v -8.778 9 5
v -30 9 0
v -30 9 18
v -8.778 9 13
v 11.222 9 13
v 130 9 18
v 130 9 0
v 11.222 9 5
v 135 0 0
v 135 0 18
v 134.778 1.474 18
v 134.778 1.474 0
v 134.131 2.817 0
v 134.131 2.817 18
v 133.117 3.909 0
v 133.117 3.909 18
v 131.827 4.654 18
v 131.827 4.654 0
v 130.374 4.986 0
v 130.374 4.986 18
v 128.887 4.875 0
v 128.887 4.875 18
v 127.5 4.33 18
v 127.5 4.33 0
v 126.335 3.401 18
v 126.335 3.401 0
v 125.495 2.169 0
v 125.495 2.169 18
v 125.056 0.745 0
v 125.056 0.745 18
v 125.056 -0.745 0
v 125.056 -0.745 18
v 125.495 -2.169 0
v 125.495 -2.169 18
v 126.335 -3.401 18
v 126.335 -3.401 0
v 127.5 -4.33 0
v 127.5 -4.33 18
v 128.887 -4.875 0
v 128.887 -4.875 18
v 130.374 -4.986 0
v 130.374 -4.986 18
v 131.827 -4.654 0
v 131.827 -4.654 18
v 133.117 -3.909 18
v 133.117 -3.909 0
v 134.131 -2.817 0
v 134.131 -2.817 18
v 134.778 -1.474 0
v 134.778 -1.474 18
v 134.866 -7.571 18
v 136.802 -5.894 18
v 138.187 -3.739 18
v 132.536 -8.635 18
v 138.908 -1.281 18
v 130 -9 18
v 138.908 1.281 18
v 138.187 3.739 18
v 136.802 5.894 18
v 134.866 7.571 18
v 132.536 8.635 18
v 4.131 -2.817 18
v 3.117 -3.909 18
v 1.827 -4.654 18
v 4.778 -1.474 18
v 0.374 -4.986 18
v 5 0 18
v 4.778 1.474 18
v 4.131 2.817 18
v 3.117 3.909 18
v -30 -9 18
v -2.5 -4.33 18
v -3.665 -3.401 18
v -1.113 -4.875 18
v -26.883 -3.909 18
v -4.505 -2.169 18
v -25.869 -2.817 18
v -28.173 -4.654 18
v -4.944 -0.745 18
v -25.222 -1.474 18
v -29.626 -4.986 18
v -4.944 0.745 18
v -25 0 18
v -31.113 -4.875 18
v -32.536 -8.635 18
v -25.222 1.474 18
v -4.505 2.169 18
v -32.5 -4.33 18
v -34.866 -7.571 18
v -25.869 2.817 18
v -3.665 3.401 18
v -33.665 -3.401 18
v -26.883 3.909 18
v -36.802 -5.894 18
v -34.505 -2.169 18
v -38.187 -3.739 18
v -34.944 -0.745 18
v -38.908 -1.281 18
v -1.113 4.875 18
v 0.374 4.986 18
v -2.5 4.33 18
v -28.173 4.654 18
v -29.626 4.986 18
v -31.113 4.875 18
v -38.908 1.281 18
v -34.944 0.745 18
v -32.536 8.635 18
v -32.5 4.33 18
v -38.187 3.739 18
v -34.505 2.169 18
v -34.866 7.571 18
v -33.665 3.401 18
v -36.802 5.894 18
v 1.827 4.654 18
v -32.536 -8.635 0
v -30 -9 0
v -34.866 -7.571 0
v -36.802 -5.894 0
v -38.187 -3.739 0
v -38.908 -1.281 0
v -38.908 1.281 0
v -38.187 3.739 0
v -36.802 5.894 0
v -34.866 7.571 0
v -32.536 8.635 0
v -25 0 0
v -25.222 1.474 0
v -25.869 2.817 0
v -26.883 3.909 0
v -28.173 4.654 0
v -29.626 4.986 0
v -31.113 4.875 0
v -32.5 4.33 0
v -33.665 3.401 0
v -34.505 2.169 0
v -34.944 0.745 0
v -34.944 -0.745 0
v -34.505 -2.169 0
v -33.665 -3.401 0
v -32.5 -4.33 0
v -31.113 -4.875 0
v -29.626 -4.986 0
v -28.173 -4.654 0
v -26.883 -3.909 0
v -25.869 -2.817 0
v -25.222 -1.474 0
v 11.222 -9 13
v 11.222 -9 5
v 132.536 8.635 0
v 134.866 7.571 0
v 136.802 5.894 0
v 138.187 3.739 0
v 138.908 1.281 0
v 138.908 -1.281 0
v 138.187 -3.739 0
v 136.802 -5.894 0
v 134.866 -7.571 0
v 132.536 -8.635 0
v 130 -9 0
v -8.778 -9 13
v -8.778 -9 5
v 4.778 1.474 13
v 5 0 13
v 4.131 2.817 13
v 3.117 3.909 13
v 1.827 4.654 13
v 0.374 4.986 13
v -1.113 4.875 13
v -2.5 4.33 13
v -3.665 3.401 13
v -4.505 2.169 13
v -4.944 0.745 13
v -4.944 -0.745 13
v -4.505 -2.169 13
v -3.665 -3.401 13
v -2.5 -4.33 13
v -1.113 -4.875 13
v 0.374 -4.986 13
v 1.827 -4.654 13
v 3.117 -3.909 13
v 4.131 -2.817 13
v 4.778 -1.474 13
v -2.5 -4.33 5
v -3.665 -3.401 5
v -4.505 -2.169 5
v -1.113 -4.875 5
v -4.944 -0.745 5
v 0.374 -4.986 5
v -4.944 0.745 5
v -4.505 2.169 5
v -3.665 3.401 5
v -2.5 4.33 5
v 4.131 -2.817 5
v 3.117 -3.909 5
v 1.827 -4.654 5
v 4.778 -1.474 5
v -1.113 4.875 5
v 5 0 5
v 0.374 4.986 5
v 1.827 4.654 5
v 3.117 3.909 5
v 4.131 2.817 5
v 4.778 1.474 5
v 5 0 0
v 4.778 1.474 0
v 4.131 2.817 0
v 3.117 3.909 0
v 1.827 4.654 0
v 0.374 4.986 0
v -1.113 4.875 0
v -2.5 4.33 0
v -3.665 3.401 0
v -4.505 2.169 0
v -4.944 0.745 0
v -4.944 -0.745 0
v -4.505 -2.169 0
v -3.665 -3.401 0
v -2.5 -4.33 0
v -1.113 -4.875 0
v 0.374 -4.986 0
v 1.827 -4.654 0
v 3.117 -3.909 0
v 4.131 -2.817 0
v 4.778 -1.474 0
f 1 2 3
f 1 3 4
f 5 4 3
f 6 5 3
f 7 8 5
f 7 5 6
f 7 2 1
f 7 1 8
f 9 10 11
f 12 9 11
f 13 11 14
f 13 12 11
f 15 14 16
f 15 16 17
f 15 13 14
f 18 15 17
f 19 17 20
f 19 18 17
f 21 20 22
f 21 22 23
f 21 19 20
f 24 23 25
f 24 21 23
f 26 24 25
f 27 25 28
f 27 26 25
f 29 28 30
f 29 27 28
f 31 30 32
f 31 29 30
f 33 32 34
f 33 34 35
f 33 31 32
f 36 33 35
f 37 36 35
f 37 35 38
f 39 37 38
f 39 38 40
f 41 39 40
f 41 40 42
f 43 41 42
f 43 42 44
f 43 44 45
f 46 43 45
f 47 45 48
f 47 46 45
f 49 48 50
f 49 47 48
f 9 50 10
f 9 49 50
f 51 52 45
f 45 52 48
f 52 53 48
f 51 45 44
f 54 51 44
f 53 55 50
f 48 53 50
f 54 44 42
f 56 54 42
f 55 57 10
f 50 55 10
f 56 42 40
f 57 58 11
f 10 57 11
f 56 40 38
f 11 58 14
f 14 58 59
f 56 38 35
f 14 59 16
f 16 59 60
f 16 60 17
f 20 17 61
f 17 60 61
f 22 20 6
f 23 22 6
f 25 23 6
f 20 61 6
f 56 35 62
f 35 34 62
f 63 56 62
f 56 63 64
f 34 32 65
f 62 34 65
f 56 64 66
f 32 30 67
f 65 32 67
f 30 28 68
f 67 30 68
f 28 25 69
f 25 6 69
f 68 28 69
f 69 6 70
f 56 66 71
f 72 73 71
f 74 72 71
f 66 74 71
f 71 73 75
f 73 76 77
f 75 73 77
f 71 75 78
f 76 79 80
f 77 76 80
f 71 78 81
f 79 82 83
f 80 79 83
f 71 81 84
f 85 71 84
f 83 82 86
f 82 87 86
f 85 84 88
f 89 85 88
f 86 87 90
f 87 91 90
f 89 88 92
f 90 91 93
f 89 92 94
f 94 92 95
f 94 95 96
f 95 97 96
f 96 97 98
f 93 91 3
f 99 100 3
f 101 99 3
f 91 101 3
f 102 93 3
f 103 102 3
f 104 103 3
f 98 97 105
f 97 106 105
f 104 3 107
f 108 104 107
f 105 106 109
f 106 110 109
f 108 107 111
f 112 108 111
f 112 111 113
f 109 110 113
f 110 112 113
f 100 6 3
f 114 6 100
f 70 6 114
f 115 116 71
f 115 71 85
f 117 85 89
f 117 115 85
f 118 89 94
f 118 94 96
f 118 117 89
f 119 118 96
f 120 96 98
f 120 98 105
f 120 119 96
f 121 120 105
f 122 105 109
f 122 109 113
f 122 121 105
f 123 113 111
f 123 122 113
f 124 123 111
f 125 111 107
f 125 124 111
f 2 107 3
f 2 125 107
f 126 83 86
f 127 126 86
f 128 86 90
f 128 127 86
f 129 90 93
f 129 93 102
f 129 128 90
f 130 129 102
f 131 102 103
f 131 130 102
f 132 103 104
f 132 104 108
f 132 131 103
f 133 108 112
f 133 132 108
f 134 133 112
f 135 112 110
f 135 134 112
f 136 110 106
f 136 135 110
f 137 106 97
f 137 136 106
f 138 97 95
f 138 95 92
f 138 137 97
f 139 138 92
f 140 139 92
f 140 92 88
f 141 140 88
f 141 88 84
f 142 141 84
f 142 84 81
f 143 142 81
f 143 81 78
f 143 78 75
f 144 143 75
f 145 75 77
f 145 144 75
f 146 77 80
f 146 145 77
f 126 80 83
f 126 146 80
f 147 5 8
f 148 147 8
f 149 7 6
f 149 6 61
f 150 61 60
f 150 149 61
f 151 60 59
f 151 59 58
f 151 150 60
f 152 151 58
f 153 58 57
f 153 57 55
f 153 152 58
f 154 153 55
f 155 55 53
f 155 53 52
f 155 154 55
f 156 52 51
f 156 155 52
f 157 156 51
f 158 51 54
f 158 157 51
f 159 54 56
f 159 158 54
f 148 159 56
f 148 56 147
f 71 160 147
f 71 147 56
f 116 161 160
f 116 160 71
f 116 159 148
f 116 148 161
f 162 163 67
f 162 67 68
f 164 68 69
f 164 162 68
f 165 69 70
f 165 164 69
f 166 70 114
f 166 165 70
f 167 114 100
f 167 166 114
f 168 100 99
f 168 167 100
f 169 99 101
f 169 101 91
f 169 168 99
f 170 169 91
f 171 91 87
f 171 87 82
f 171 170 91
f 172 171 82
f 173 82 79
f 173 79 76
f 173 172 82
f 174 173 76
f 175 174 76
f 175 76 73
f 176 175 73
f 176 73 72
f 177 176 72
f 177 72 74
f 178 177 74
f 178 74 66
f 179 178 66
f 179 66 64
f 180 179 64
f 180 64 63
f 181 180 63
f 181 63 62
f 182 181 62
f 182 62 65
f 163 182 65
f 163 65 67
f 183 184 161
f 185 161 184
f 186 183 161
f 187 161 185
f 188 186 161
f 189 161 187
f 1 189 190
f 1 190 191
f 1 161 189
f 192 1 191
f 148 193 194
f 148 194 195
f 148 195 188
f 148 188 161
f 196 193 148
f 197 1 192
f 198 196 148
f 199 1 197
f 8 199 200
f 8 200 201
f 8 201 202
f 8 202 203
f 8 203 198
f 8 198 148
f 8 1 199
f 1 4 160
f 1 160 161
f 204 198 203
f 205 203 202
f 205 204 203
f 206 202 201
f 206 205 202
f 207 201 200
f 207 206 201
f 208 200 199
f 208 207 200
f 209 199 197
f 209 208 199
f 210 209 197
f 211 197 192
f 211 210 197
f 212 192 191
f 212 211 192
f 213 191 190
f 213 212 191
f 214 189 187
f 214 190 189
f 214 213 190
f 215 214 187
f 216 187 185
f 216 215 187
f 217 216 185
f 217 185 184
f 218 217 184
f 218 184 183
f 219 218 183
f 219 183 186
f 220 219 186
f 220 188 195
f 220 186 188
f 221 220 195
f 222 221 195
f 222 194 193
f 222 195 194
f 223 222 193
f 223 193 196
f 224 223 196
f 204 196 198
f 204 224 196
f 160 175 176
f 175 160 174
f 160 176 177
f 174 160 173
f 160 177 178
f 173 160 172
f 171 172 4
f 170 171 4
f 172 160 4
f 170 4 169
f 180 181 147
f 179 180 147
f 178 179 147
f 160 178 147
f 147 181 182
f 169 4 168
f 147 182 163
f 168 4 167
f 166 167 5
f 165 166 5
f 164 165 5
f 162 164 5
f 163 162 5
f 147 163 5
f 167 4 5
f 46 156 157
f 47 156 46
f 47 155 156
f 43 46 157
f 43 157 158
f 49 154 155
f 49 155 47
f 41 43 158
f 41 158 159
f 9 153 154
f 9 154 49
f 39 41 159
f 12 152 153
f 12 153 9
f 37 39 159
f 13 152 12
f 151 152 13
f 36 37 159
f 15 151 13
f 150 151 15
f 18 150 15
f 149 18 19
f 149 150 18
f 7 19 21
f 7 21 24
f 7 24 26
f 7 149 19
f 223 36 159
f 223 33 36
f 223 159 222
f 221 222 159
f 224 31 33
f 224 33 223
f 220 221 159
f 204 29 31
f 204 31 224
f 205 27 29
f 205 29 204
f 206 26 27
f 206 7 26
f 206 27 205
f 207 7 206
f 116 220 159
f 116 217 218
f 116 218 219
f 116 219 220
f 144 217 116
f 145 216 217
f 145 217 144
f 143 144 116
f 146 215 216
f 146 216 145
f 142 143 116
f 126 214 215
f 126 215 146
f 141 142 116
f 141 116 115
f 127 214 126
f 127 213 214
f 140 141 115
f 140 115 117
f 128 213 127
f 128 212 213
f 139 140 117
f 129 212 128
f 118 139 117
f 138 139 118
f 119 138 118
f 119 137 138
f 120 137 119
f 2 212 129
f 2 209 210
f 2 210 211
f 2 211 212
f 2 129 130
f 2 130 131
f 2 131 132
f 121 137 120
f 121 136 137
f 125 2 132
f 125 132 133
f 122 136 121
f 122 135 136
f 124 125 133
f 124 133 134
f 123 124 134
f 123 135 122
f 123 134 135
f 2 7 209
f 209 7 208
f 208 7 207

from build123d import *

# Parameters (mm, degrees)
SKETCH1_R           = 5
BOSS_EXTRUDE1_DEPTH = 18
SKETCH3_W           = 20
SKETCH3_H           = 8
CUT_EXTRUDE1_DEPTH  = 18


with BuildPart() as part:
    # Sketch1 → Boss-Extrude1 (new body)
    with BuildSketch(Plane.XY):
        with BuildLine():
            Line((-30, 9), (130, 9))
            ThreePointArc((130, 9), (139, 0), (130, -9))
            Line((130, -9), (-30, -9))
            ThreePointArc((-30, -9), (-39, 0), (-30, 9))
        make_face()
        Circle(SKETCH1_R, mode=Mode.SUBTRACT)
        with Locations((130, 0)):
            Circle(SKETCH1_R, mode=Mode.SUBTRACT)
        with Locations((-30, 0)):
            Circle(SKETCH1_R, mode=Mode.SUBTRACT)
    extrude(amount=BOSS_EXTRUDE1_DEPTH)

    # Sketch3 → Cut-Extrude1 (cut)
    with BuildSketch(Plane(origin=(0, 9, 0), x_dir=(1, 0, 0), z_dir=(0, 1, 0))):
        with Locations((1.222079484, -9)):
            Rectangle(SKETCH3_W, SKETCH3_H)
    extrude(amount=-CUT_EXTRUDE1_DEPTH, mode=Mode.SUBTRACT)


solid = part.part
